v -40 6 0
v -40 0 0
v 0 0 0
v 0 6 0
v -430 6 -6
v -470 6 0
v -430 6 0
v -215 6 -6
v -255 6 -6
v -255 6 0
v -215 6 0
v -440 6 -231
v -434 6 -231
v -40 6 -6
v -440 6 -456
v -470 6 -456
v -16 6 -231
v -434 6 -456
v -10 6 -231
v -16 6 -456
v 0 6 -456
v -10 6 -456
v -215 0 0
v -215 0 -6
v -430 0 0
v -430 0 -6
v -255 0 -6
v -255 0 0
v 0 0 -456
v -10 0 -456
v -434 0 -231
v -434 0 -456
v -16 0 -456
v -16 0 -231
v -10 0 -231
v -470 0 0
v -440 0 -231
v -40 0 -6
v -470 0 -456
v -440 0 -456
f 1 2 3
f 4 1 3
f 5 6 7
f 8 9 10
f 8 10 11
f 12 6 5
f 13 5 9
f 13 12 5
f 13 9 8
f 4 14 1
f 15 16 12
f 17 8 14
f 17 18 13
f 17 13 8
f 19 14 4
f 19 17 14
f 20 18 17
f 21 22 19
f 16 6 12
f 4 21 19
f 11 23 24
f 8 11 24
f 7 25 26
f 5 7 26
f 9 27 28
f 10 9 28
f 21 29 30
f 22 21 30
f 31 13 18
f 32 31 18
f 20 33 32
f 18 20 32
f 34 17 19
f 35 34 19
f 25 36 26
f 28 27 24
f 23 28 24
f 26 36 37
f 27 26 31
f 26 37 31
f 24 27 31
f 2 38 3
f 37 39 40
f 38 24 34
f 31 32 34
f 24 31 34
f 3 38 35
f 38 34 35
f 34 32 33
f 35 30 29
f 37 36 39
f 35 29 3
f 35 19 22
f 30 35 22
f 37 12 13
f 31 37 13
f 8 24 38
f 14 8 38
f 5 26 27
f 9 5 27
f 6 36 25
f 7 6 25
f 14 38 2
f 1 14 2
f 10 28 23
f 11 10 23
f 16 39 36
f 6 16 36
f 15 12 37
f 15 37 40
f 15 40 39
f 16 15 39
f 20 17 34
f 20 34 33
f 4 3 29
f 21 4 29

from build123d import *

# Parameters (mm, degrees)
BOSS_EXTRUDE1_DEPTH = 6
SKETCH2_W           = 6
SKETCH2_H           = 225
CUT_EXTRUDE1_DEPTH  = 6
LPATTERN1_COUNT     = 2
LPATTERN1_PITCH     = 424


with BuildPart() as part:
    # Sketch1 → Boss-Extrude1 (new body)
    with BuildSketch(Plane(origin=(0, 0, 0), x_dir=(1, 0, 0), z_dir=(0, 1, 0))):
        Polygon((-470, 0), (-430, 0), (-430, 6), (-255, 6), (-255, 0), (-215, 0), (-215, 6), (-40, 6), (-40, 0), (0, 0), (0, 456), (-470, 456), align=None)
    extrude(amount=BOSS_EXTRUDE1_DEPTH)

    # Sketch2 → Cut-Extrude1 (cut)
    with BuildSketch(Plane(origin=(0, 6, 0), x_dir=(1, 0, 0), z_dir=(0, 1, 0))):
        with Locations((-13, 343.5)):
            Rectangle(SKETCH2_W, SKETCH2_H)
    cut_extrude1 = extrude(amount=-CUT_EXTRUDE1_DEPTH, mode=Mode.SUBTRACT)

    # LPattern1: Cut-Extrude1 ×2
    with Locations(*[(-i * LPATTERN1_PITCH, 0, 0) for i in range(1, LPATTERN1_COUNT)]):
        add(cut_extrude1, mode=Mode.SUBTRACT)


solid = part.part
